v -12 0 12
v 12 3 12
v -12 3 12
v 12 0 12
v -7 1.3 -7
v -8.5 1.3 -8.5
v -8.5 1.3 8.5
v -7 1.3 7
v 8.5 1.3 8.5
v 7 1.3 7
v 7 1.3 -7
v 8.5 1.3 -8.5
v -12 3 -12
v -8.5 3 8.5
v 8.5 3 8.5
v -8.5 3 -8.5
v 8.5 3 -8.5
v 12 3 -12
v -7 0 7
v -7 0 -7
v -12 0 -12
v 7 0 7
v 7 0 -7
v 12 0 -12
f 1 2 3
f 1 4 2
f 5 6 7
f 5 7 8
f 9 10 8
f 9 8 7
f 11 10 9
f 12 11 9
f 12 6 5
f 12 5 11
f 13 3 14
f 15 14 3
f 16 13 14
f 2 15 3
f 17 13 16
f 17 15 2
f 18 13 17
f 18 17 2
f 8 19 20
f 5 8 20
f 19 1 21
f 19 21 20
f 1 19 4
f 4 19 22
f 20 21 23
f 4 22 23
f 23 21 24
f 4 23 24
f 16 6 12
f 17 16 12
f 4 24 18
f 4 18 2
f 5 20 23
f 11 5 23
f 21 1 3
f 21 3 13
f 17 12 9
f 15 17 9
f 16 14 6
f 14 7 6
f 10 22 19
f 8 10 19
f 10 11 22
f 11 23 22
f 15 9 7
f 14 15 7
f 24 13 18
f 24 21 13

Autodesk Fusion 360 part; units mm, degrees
sketch "Switch" plane through (0, 0, 0) normal (0, 1, 0) x (1, 0, 0)
  line L0 (-7, 7) -> (7, 7)
  line L1 (-8.5, -8.5) -> (-8.5, 8.5)
  line L2 (7, -7) -> (-7, -7)
  line L3 (-8.5, 8.5) -> (8.5, 8.5)
  line L4 (-8.5, -8.5) -> (8.5, 8.5) construction
  line L5 (-7, -7) -> (7, 7) construction
  line L6 (8.5, -8.5) -> (-8.5, -8.5)
  line L7 (-7, -7) -> (-7, 7)
  line L8 (7, 7) -> (7, -7)
  line L9 (8.5, 8.5) -> (8.5, -8.5)
  line L10 (8.5, -8.5) -> (-8.5, 8.5) construction
  line L11 (7, -7) -> (-7, 7) construction
  line L12 (-12, 12) -> (12, 12)
  line L13 (12, 12) -> (12, -12)
  line L14 (12, -12) -> (-12, -12)
  line L15 (-12, -12) -> (-12, 12)
  line L16 (-12, 12) -> (12, -12) construction
  line L17 (12, 12) -> (-12, -12) construction
  dimension "d1" = 14
  dimension "d2" = 14
  dimension "d3" = 1.5
  dimension "d4" = 1.5
  dimension "d5" = 1.5
  dimension "d6" = 1.5
  dimension "d7" = 24
  dimension "d8" = 24
extrude "Switch Extrusion" add sketch "Switch" along normal blind 3 contours L12 L13 L14 L15
extrude "Switch Hole Extrusion" add sketch "Switch" along normal blind 1.3 contours L1 L3 L6 L9
